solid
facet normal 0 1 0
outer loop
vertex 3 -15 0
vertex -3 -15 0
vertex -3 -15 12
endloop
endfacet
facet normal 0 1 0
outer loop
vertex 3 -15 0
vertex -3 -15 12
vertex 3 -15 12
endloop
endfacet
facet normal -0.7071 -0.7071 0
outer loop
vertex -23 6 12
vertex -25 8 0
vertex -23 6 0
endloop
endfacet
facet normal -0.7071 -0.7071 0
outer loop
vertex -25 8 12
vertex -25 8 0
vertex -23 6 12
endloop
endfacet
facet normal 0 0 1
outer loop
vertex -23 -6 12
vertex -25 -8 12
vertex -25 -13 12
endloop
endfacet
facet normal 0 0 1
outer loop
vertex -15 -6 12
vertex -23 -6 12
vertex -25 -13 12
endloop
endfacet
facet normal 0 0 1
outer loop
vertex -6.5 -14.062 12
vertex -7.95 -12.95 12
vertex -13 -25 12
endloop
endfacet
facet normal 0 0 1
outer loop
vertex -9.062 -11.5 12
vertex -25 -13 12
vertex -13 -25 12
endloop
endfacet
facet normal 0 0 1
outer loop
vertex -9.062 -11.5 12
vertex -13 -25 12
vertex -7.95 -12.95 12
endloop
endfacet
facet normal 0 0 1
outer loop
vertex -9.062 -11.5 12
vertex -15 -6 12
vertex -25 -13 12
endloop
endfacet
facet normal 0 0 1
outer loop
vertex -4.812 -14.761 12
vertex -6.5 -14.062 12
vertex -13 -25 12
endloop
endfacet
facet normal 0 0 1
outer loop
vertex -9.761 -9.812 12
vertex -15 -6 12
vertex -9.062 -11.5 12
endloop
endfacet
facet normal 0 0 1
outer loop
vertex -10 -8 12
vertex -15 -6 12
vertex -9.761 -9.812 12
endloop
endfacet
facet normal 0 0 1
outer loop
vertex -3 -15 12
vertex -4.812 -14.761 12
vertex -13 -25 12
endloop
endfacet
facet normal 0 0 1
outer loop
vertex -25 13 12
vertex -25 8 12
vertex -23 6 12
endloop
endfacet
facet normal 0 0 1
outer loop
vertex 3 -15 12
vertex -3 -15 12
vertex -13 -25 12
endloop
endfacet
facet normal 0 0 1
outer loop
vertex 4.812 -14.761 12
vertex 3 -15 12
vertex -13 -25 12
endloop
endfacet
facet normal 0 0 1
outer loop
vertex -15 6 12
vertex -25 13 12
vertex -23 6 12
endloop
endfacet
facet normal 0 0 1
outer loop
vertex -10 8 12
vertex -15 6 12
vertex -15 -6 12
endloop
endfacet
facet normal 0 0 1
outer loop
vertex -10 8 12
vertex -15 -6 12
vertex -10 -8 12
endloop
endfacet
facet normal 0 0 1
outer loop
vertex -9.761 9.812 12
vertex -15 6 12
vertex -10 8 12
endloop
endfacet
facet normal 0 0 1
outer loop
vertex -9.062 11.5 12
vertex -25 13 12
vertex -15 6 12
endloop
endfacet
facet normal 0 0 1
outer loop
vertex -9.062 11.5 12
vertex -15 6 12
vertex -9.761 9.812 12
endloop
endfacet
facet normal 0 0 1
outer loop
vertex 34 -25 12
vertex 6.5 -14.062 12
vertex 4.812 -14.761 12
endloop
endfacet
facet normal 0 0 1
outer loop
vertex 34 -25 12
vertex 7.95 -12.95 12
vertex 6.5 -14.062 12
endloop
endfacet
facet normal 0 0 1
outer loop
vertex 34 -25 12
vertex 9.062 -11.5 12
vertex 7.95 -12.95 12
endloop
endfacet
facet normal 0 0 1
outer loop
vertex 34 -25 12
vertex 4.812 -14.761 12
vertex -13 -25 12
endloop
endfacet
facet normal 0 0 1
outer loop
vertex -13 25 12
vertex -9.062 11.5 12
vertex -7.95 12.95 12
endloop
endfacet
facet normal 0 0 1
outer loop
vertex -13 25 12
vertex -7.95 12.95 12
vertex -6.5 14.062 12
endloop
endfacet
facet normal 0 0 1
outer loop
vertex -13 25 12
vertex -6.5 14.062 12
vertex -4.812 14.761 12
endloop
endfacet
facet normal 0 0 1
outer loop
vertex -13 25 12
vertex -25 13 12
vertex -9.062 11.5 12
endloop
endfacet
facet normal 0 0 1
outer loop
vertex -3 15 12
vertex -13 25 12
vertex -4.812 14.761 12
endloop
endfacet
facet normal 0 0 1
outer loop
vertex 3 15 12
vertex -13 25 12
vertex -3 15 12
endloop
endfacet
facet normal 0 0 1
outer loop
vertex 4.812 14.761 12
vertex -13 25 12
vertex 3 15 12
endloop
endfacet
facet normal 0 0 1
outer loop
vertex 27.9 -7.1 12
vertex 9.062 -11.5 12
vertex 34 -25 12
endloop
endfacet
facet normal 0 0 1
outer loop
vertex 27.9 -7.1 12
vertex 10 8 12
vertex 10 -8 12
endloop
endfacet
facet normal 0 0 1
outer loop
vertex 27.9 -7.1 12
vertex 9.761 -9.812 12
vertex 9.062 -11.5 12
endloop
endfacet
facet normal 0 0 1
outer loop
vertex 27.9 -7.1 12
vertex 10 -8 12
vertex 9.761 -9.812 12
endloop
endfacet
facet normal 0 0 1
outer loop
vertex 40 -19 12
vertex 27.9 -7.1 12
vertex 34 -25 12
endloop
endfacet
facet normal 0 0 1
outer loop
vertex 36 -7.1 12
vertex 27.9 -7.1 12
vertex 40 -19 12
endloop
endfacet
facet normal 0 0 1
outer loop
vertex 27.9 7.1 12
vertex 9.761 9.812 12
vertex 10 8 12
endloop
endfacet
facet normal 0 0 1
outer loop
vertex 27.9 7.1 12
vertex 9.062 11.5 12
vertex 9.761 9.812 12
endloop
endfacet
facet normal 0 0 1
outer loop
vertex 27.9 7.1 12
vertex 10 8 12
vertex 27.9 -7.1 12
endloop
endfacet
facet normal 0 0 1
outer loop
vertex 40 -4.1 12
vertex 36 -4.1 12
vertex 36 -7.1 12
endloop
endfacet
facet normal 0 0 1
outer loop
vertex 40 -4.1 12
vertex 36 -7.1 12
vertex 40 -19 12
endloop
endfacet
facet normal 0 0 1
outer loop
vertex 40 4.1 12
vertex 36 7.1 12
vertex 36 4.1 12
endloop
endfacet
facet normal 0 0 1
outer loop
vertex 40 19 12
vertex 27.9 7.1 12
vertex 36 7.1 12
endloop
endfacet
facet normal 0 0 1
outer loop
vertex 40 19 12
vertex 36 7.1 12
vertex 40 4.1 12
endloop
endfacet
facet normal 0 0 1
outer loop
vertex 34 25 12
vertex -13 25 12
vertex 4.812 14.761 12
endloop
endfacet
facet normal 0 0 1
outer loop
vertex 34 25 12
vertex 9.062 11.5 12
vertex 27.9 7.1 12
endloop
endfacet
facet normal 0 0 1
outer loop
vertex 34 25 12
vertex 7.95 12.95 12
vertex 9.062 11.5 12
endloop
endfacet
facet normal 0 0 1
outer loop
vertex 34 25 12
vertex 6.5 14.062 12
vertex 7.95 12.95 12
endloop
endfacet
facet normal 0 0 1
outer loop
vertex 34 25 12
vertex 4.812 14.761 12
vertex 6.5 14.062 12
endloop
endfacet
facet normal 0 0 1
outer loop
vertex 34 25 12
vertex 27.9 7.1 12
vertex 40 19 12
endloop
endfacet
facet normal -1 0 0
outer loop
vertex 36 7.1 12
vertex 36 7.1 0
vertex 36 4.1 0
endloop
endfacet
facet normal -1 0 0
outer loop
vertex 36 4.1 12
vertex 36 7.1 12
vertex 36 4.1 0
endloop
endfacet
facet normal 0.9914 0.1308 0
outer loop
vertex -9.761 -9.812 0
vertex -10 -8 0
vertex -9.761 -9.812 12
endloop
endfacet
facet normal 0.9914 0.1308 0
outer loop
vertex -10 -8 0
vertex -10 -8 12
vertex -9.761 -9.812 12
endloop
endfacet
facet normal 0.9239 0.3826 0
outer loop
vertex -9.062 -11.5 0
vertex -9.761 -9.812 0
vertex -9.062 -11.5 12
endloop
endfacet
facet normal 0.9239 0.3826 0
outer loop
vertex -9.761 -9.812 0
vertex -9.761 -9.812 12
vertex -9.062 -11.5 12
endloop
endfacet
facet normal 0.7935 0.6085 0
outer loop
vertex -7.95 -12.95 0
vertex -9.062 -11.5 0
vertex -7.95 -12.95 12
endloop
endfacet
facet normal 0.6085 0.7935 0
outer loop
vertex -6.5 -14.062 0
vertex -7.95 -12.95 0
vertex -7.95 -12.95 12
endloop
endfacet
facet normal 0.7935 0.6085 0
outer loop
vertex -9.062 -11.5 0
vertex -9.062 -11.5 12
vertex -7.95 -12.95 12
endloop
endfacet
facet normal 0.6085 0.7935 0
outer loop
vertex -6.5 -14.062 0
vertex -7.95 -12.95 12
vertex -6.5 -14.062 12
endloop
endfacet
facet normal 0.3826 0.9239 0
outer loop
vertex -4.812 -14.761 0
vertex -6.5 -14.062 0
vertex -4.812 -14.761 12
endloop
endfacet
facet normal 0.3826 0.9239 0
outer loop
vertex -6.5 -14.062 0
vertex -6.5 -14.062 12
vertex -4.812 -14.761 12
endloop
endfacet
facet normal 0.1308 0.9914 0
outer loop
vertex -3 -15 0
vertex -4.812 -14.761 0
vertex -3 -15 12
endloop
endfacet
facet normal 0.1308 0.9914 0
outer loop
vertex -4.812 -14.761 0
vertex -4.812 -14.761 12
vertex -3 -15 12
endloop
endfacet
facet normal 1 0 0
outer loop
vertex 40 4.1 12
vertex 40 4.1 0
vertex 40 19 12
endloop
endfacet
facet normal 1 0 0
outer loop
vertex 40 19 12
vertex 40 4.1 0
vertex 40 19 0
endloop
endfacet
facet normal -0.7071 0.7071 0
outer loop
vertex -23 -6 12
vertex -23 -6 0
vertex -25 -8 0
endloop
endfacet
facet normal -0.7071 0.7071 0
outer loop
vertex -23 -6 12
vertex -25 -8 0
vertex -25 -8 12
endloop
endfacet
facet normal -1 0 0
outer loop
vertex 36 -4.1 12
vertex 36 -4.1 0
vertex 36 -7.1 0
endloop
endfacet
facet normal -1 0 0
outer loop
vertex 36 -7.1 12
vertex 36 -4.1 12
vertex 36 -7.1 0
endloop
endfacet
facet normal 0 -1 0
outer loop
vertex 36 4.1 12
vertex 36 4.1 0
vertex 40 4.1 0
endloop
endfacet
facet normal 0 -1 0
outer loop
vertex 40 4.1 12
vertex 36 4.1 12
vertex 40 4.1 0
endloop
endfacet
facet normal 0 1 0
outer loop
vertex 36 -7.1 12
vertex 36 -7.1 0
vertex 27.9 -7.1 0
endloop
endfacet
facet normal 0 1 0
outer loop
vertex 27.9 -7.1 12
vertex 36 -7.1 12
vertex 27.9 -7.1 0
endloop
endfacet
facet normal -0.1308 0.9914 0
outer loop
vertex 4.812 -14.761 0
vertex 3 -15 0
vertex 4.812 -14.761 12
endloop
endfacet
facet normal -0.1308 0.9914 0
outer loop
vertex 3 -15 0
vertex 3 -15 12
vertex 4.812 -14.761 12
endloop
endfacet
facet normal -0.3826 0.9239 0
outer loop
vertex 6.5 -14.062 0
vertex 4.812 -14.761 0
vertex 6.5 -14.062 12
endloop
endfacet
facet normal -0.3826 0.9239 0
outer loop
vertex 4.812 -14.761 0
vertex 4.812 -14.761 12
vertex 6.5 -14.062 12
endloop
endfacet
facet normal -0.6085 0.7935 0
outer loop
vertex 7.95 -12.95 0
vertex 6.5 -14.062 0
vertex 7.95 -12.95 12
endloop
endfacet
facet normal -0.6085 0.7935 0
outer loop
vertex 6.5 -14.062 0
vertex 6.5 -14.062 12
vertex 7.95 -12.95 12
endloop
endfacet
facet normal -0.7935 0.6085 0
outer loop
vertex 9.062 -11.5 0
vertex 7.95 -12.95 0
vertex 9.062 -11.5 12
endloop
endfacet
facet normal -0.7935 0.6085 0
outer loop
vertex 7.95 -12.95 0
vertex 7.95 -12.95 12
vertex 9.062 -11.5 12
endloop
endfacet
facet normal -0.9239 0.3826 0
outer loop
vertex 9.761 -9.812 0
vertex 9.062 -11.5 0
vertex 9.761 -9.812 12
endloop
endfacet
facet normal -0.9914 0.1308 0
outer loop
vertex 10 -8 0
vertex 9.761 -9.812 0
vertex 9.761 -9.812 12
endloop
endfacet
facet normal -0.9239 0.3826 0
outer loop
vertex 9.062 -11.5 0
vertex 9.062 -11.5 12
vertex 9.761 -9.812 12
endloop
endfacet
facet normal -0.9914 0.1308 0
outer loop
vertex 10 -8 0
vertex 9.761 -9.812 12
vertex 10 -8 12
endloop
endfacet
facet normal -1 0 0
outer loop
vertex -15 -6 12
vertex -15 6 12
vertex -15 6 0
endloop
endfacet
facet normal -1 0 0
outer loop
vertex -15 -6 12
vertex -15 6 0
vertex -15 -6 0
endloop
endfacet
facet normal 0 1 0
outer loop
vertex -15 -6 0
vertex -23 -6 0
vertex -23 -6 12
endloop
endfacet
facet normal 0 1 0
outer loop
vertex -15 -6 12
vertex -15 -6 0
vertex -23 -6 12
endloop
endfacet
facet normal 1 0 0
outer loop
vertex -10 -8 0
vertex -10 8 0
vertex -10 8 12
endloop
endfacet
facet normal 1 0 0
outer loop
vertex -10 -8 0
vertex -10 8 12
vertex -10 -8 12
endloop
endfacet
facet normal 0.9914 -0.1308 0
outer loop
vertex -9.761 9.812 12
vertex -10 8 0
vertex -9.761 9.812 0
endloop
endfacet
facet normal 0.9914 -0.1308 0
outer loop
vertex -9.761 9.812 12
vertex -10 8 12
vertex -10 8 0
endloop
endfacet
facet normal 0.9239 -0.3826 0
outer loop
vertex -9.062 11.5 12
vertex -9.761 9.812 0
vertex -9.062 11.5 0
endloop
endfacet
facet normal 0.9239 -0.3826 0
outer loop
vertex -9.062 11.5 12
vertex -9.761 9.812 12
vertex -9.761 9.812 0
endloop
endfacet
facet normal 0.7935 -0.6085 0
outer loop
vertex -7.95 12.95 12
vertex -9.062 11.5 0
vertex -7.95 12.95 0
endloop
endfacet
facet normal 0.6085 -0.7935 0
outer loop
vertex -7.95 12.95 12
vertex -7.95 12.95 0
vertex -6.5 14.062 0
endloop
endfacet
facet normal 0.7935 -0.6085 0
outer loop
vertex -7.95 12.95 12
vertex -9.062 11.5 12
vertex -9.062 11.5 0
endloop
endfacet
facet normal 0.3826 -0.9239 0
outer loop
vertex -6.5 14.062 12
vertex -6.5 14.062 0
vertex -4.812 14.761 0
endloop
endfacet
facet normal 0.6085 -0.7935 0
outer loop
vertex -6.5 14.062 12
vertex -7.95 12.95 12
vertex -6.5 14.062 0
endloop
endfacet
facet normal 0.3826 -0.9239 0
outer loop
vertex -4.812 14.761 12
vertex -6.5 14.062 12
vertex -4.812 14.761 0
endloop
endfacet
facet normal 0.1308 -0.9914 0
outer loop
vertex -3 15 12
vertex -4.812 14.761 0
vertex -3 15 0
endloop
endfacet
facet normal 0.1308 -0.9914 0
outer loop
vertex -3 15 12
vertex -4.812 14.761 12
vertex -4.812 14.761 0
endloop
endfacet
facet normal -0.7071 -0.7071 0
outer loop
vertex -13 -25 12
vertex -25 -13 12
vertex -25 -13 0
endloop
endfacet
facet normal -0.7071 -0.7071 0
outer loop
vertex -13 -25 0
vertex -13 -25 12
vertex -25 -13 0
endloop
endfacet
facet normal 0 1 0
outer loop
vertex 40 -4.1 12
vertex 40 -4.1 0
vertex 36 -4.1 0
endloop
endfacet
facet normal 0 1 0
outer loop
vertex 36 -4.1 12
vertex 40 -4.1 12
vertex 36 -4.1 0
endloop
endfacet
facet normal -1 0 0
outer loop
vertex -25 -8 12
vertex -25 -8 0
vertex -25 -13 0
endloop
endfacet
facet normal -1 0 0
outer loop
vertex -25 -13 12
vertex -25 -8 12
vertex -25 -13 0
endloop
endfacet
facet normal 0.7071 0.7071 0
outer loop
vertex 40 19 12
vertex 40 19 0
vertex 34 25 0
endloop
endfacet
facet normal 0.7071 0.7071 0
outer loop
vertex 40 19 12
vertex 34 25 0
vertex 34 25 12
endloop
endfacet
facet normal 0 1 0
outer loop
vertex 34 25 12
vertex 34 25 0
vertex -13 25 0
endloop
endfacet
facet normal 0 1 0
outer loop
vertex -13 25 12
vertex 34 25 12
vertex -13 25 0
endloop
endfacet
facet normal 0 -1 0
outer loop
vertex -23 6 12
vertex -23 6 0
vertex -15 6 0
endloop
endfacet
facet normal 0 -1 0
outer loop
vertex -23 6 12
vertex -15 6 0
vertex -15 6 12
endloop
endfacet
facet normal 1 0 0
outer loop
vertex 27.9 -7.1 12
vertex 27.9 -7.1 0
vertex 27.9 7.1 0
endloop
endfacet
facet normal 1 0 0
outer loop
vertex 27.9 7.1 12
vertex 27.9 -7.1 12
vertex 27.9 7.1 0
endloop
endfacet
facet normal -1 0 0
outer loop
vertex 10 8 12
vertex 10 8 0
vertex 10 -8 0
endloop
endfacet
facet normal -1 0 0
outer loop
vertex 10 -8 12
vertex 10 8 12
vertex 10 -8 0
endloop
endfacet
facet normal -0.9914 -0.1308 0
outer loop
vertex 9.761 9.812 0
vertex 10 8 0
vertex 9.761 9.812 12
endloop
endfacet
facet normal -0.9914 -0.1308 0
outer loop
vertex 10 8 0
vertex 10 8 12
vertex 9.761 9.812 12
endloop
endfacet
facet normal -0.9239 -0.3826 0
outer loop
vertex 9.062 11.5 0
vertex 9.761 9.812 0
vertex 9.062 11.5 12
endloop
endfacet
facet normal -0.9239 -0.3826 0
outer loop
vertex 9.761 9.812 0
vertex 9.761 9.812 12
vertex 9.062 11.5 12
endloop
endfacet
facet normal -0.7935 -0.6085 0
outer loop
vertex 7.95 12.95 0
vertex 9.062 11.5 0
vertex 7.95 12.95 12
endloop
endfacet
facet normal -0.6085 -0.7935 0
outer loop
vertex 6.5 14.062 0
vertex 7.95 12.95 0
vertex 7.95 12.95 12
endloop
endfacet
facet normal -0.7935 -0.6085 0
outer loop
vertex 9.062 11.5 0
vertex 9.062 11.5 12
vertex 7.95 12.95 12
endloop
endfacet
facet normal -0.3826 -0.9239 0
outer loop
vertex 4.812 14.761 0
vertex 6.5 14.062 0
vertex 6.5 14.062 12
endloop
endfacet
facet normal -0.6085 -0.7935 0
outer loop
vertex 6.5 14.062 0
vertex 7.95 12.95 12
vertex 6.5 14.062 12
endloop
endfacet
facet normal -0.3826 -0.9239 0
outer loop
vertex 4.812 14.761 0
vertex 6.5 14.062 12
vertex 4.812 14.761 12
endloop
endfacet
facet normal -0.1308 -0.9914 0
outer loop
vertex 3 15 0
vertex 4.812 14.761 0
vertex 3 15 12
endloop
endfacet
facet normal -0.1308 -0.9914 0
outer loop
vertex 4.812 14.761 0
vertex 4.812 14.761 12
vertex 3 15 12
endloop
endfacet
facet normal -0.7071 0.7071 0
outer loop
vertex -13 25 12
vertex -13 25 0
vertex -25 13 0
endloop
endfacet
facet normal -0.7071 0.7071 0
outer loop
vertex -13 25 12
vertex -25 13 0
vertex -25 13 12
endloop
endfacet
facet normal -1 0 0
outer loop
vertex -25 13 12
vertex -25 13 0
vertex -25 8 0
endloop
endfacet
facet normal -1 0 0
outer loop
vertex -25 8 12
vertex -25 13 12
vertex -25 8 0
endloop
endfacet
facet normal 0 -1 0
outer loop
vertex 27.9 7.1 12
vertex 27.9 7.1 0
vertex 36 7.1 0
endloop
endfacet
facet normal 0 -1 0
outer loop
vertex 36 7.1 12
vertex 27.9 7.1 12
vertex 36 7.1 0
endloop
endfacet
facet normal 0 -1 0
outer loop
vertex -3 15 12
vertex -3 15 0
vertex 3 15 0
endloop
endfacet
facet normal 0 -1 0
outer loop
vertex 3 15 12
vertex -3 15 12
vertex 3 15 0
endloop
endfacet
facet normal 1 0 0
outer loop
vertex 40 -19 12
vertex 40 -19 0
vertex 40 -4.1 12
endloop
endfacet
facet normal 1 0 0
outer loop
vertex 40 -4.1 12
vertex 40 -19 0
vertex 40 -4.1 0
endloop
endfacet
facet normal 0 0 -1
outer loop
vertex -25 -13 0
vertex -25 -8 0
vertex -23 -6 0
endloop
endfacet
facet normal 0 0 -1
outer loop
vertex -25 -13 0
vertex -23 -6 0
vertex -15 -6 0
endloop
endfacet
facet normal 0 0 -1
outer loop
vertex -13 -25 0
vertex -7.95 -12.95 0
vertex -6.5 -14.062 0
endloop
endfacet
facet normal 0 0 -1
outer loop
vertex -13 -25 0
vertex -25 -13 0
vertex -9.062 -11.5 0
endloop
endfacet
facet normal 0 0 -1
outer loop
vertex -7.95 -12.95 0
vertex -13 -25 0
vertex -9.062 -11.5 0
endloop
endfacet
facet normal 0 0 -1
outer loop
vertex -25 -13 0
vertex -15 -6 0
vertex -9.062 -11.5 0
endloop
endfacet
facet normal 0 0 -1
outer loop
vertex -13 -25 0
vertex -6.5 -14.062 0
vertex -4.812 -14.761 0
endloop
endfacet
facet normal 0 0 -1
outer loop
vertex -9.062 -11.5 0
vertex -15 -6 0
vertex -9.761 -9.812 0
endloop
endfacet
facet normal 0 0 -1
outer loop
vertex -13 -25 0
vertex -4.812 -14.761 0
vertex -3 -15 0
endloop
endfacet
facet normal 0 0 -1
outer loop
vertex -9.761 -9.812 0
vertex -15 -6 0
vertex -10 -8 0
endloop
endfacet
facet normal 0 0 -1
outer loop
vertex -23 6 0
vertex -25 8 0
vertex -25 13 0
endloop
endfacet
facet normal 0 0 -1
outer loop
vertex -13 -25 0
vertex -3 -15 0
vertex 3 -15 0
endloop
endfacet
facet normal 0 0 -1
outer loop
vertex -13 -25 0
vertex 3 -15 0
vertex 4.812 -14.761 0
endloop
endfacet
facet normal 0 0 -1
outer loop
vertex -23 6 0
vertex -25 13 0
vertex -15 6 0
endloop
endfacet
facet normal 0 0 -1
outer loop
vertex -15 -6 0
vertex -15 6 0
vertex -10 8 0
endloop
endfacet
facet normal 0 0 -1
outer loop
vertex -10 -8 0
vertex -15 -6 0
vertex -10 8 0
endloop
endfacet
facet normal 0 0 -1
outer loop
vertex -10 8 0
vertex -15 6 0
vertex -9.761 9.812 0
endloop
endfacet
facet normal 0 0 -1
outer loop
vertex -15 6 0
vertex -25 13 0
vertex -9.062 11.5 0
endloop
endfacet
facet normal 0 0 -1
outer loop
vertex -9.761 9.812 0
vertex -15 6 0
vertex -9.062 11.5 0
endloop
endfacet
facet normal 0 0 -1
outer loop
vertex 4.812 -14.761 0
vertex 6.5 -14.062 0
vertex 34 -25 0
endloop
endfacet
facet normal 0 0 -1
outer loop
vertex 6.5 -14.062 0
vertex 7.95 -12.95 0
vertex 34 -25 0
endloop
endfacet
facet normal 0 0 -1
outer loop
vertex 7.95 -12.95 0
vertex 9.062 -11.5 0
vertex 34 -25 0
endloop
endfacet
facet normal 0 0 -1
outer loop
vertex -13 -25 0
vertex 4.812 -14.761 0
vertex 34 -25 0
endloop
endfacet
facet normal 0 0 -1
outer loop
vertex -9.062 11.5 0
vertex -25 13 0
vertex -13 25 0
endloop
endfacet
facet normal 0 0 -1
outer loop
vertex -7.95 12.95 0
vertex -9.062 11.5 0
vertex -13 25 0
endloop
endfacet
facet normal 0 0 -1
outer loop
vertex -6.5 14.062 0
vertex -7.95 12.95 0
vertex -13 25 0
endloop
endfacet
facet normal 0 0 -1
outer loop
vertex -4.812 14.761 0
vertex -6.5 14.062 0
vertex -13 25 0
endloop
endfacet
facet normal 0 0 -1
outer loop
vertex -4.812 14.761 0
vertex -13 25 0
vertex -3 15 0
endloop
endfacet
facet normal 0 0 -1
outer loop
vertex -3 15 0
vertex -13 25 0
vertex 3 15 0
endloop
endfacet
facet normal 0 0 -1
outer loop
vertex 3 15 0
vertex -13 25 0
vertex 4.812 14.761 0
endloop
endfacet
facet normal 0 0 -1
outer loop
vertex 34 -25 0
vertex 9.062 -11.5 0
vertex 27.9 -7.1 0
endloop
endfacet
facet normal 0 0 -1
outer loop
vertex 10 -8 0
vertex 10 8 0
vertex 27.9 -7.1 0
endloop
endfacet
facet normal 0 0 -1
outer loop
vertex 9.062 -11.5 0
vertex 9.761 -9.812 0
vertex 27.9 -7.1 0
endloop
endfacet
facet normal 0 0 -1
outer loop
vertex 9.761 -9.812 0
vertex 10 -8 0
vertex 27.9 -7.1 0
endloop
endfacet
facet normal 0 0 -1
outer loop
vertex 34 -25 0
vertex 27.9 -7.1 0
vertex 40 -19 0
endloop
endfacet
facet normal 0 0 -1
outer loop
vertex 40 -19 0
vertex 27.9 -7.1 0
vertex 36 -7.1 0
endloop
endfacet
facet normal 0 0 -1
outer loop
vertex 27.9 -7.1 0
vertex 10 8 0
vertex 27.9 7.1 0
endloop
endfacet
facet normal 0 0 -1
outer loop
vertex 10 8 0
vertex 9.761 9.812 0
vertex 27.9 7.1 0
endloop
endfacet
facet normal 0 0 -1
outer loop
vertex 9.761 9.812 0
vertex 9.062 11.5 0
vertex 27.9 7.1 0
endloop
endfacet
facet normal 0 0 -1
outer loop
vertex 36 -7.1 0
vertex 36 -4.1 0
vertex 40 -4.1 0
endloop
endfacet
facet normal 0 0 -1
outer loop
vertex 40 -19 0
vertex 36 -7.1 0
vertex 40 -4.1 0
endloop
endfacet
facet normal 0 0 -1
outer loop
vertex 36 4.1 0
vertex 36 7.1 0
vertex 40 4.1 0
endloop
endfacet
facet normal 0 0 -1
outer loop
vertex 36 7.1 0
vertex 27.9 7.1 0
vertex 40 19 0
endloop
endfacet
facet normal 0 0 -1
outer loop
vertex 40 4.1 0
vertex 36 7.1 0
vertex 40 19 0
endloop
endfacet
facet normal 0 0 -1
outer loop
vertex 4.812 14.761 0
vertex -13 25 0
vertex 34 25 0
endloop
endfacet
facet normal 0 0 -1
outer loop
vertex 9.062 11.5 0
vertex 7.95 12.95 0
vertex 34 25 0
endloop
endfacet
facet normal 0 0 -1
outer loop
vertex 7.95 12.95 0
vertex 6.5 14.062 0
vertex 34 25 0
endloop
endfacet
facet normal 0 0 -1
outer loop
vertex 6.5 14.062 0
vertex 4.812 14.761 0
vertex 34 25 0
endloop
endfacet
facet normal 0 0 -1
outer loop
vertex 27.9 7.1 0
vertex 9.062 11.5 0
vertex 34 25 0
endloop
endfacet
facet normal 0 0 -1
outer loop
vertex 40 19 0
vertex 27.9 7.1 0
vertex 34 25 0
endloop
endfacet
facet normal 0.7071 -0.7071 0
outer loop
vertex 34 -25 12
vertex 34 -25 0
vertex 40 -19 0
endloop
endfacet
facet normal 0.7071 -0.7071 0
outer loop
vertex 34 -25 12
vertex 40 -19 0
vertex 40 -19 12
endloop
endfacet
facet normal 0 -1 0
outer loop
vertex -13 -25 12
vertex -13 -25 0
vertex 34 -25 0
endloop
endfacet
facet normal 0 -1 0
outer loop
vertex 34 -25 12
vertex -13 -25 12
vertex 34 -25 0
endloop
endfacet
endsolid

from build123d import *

# Parameters (mm, degrees)
F1_DEPTH = 12
F2_W     = 12
F2_H     = 12
F3_DEPTH = 25
F4_SIZE  = 6
F5_W     = 20
F5_H     = 30
F6_DEPTH = 30
F7_R     = 7
F9_DEPTH = 25
F10_SIZE = 12
F11_SIZE = 2


with BuildPart() as f1:
    # F0 (on Top) → F1 (new body)
    with BuildSketch(Plane.XY):
        Polygon((40, 25), (-40, 25), (-40, -25), (40, -25), (40, -4.1), (36, -4.1), (36, -7.1), (27.9, -7.1), (27.9, 7.1), (36, 7.1), (36, 4.1), (40, 4.1), align=None)
    extrude(amount=F1_DEPTH)

    # F2 (on face) → F3 (cut)
    with BuildSketch(Plane(origin=(-40, 0, 0), x_dir=(0, -1, 0), z_dir=(-1, 0, 0))):
        with Locations((0, 6)):
            Rectangle(F2_W, F2_H)
    extrude(amount=-F3_DEPTH, mode=Mode.SUBTRACT)

    # F4
    f4_edges = [f1.edges().sort_by_distance(p)[0] for p in [
        (-40, -25, 6),
        (-40, 25, 6),
        (-40, 6, 6),
        (-40, -6, 6),
        (40, -25, 6),
        (40, 25, 6),
    ]]
    chamfer(f4_edges, length=F4_SIZE)

    # F5 (on face) → F6 (cut)
    with BuildSketch(Plane(origin=(0, 0, 0), x_dir=(1, 0, 0), z_dir=(0, 0, -1))):
        Rectangle(F5_W, F5_H)
    extrude(amount=-F6_DEPTH, mode=Mode.SUBTRACT)

    # F7
    f7_edges = [f1.edges().sort_by_distance(p)[0] for p in [
        (10, 15, 6),
        (-10, 15, 6),
        (-10, -15, 6),
        (10, -15, 6),
    ]]
    fillet(f7_edges, radius=F7_R)

    # F8 (on face) → F9 (cut)
    with BuildSketch(Plane(origin=(0, 0, 0), x_dir=(1, 0, 0), z_dir=(0, 0, -1))):
        Polygon((-41.9909754243, -28.1055098634), (-25, -28.1055098634), (-25, -25), (-34, -25), (-40, -19), (-40, -12), (-34, -6), (-25, -6), (-25, 6), (-34, 6), (-40, 12), (-40, 19), (-34, 25), (-25, 25), (-25, 27.3810768734), (-41.9909754243, 27.3810768734), align=None)
        Polygon((-34, -25), (-25, -25), (-25, -6), (-34, -6), (-40, -12), (-40, -19), align=None)
        Polygon((-34, 6), (-25, 6), (-25, 25), (-34, 25), (-40, 19), (-40, 12), align=None)
    extrude(amount=-F9_DEPTH, mode=Mode.SUBTRACT)

    # F10
    f10_edges = [f1.edges().sort_by_distance(p)[0] for p in [
        (-25, 25, 6),
        (-25, -25, 6),
    ]]
    chamfer(f10_edges, length=F10_SIZE)

    # F11
    f11_edges = [f1.edges().sort_by_distance(p)[0] for p in [
        (-25, 6, 6),
        (-25, -6, 6),
    ]]
    chamfer(f11_edges, length=F11_SIZE)


solid = f1.part
